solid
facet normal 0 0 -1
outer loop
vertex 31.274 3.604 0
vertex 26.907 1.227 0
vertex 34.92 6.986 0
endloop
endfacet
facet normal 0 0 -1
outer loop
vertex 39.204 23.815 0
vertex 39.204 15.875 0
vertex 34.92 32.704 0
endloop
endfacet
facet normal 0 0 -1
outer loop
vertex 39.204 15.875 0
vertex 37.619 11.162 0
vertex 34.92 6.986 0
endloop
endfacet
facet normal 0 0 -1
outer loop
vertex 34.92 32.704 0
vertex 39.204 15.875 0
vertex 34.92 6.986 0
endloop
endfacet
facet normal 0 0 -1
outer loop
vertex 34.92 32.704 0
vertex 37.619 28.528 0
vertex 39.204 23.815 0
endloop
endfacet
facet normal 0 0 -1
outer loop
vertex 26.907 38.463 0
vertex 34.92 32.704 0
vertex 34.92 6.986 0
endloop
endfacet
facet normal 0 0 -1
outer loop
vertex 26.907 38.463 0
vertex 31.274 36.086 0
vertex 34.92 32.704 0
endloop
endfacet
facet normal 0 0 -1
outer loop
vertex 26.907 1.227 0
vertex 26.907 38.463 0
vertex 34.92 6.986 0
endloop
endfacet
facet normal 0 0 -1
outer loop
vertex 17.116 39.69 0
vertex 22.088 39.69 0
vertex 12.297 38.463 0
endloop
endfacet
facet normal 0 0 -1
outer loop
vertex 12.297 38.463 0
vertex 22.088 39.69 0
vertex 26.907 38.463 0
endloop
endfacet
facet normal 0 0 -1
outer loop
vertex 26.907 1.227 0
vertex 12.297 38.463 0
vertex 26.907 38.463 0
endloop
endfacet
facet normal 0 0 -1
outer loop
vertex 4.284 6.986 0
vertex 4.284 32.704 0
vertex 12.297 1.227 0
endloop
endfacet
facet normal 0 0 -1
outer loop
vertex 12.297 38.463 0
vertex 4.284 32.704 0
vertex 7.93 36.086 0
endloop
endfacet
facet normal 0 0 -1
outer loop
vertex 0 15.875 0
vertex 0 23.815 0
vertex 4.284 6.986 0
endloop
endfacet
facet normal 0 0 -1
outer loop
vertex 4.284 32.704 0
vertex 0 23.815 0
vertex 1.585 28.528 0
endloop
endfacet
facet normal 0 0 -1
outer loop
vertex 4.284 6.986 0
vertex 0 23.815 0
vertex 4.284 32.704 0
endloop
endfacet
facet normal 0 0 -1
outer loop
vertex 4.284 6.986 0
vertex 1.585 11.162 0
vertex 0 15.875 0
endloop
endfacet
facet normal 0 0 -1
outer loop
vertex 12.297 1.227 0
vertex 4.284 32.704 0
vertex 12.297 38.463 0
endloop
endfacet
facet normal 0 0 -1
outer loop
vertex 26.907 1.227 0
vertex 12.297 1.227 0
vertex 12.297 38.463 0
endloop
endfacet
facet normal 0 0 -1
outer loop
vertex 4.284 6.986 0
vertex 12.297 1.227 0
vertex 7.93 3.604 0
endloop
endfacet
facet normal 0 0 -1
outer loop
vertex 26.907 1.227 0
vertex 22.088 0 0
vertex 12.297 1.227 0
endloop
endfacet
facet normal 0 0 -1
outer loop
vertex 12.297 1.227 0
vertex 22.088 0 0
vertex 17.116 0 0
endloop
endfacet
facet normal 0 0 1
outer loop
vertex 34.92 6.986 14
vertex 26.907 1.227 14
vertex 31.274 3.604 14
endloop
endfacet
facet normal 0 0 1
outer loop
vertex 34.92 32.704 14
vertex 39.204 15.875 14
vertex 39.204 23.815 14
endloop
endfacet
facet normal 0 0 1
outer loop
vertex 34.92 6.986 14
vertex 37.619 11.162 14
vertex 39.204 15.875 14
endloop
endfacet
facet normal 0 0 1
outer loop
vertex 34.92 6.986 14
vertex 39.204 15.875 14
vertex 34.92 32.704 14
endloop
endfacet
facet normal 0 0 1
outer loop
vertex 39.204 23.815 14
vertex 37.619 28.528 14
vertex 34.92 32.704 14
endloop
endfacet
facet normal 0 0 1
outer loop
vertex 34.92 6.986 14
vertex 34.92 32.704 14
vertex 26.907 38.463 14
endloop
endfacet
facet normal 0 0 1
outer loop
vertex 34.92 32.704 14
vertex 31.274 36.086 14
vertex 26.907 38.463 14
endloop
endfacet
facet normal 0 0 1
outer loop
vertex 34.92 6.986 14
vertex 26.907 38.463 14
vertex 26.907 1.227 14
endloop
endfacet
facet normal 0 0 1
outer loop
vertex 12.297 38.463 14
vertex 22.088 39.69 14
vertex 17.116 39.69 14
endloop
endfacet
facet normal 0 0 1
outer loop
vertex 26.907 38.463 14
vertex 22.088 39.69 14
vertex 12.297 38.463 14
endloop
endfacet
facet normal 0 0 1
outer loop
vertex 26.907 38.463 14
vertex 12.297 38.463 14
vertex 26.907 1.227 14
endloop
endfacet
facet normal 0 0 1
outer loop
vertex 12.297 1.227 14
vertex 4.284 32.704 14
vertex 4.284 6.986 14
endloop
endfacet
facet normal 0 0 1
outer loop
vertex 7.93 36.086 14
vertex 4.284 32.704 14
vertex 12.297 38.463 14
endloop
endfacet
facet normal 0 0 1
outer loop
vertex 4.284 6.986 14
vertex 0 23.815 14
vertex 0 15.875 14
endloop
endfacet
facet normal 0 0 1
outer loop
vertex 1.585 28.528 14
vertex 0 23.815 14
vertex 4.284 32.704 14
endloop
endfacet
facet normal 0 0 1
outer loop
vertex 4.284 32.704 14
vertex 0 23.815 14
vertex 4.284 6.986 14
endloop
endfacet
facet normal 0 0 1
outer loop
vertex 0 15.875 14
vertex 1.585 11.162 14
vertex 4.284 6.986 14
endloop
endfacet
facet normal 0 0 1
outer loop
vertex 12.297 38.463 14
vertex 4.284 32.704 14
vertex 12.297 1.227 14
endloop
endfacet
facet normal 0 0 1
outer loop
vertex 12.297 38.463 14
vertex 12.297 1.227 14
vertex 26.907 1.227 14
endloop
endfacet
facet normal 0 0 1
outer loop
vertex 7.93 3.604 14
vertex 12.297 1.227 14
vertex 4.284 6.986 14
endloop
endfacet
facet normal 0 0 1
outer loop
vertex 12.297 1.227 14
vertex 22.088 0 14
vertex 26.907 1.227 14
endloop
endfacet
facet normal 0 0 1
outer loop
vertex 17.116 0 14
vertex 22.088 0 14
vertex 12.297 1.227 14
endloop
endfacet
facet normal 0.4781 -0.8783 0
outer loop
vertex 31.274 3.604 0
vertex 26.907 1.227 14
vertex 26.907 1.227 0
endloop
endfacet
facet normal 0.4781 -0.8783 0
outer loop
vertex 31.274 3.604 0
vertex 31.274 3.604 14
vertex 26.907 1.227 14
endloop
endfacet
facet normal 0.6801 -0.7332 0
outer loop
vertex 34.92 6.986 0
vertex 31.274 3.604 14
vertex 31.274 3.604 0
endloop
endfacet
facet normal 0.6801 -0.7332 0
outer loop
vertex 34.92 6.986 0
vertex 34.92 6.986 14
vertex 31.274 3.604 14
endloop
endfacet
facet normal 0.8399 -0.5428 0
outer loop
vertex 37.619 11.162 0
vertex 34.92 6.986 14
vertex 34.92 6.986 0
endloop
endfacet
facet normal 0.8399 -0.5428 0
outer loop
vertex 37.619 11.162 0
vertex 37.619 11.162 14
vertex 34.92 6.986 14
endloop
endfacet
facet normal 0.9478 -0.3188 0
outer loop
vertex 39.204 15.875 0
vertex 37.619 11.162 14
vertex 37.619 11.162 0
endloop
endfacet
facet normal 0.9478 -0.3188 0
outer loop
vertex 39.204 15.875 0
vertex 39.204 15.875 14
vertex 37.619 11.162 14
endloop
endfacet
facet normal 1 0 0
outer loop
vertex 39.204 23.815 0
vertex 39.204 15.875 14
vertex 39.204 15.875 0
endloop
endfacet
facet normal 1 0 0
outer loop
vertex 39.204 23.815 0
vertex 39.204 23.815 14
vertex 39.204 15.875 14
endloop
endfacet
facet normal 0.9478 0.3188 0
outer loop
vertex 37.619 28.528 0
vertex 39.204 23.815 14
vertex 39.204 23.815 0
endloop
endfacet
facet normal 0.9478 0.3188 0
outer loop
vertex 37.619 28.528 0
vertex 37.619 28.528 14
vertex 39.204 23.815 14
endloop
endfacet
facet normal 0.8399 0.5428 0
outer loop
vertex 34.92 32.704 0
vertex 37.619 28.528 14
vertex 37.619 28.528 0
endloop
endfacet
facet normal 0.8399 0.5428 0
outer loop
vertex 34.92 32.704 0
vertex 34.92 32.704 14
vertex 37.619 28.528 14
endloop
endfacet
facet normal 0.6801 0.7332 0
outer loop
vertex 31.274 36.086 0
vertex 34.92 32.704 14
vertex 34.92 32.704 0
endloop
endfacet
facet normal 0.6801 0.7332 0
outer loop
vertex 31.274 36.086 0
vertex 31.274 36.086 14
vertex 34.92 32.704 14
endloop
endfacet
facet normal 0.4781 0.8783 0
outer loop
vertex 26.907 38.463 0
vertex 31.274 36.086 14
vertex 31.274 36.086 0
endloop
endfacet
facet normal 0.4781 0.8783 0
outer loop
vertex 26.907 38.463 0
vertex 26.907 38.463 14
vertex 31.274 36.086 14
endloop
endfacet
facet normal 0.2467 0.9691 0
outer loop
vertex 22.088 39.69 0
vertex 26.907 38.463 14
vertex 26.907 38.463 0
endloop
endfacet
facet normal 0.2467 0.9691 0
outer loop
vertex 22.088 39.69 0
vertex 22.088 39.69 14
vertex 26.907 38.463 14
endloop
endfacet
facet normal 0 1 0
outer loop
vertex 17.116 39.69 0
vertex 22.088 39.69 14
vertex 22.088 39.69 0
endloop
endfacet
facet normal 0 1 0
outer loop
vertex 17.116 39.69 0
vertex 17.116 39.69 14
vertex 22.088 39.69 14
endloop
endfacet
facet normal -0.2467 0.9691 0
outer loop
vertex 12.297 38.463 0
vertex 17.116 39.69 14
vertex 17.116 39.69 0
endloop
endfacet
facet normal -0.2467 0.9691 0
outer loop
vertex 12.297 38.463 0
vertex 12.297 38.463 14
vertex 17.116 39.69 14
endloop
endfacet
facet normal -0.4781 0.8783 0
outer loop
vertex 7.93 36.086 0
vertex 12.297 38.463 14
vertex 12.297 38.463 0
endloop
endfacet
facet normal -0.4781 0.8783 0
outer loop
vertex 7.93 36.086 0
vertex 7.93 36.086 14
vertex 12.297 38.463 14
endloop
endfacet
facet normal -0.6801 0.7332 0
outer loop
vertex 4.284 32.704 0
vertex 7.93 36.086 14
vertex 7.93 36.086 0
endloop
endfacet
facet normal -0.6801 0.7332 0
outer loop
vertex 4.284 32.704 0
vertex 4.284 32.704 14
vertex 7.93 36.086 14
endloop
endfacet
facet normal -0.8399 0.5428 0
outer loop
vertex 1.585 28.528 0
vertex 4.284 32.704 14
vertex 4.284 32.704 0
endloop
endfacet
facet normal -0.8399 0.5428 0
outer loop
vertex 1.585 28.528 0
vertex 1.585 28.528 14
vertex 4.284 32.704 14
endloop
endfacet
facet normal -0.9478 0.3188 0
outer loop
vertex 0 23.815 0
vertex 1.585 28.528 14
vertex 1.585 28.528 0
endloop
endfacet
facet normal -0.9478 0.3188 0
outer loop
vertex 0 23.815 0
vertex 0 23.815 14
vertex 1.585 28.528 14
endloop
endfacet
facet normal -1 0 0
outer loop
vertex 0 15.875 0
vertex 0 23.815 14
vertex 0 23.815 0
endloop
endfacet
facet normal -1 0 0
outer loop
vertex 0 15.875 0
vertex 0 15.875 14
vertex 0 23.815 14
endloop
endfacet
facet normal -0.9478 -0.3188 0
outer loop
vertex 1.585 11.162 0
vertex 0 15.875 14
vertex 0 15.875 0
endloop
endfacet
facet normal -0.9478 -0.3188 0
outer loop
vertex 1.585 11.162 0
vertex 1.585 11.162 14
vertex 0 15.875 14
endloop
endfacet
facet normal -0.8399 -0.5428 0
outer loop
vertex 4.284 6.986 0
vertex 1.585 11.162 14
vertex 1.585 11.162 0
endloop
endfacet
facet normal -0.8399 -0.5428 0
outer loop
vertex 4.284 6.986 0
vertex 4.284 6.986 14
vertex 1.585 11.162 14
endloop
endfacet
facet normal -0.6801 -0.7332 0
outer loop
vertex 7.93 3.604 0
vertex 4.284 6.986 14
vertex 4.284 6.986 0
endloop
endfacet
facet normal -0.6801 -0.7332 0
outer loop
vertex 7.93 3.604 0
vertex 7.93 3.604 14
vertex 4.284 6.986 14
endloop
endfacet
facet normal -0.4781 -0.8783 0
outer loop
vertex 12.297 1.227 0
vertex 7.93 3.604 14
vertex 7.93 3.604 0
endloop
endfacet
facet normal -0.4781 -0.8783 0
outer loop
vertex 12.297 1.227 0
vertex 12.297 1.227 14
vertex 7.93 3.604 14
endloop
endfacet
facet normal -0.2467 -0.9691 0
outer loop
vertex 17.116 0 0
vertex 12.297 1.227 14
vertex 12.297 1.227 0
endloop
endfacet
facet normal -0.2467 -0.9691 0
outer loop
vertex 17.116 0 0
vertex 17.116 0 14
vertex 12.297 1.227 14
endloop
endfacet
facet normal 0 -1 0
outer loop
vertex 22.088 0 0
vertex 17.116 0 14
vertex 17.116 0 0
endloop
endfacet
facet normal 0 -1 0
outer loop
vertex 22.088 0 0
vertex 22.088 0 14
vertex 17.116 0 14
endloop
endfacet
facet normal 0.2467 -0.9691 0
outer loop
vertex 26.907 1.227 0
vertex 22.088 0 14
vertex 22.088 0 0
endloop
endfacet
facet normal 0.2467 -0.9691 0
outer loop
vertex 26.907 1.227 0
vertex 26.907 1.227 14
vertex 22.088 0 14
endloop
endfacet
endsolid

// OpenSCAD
$fn = 32;

// ----------------------------------------------------------------------
// Flat adaptor: double_d, 14 mm thick
// ----------------------------------------------------------------------

// --- parameters (mm) ---
profile_height = 14;      // extrusion height
profile_points = 24;      // points of the closed outline

profile = [[39.204, 23.815], [37.619, 28.528], [34.92, 32.704], [31.274, 36.086], [26.907, 38.463], [22.088, 39.69], [17.116, 39.69], [12.297, 38.463], [7.93, 36.086], [4.284, 32.704], [1.585, 28.528], [0, 23.815], [0, 15.875], [1.585, 11.162], [4.284, 6.986], [7.93, 3.604], [12.297, 1.227], [17.116, 0], [22.088, 0], [26.907, 1.227], [31.274, 3.604], [34.92, 6.986], [37.619, 11.162], [39.204, 15.875]];  // single closed polygon, 24 points, counter clockwise

// --- the one profile operation ---
linear_extrude(height = profile_height) polygon(points = profile);
